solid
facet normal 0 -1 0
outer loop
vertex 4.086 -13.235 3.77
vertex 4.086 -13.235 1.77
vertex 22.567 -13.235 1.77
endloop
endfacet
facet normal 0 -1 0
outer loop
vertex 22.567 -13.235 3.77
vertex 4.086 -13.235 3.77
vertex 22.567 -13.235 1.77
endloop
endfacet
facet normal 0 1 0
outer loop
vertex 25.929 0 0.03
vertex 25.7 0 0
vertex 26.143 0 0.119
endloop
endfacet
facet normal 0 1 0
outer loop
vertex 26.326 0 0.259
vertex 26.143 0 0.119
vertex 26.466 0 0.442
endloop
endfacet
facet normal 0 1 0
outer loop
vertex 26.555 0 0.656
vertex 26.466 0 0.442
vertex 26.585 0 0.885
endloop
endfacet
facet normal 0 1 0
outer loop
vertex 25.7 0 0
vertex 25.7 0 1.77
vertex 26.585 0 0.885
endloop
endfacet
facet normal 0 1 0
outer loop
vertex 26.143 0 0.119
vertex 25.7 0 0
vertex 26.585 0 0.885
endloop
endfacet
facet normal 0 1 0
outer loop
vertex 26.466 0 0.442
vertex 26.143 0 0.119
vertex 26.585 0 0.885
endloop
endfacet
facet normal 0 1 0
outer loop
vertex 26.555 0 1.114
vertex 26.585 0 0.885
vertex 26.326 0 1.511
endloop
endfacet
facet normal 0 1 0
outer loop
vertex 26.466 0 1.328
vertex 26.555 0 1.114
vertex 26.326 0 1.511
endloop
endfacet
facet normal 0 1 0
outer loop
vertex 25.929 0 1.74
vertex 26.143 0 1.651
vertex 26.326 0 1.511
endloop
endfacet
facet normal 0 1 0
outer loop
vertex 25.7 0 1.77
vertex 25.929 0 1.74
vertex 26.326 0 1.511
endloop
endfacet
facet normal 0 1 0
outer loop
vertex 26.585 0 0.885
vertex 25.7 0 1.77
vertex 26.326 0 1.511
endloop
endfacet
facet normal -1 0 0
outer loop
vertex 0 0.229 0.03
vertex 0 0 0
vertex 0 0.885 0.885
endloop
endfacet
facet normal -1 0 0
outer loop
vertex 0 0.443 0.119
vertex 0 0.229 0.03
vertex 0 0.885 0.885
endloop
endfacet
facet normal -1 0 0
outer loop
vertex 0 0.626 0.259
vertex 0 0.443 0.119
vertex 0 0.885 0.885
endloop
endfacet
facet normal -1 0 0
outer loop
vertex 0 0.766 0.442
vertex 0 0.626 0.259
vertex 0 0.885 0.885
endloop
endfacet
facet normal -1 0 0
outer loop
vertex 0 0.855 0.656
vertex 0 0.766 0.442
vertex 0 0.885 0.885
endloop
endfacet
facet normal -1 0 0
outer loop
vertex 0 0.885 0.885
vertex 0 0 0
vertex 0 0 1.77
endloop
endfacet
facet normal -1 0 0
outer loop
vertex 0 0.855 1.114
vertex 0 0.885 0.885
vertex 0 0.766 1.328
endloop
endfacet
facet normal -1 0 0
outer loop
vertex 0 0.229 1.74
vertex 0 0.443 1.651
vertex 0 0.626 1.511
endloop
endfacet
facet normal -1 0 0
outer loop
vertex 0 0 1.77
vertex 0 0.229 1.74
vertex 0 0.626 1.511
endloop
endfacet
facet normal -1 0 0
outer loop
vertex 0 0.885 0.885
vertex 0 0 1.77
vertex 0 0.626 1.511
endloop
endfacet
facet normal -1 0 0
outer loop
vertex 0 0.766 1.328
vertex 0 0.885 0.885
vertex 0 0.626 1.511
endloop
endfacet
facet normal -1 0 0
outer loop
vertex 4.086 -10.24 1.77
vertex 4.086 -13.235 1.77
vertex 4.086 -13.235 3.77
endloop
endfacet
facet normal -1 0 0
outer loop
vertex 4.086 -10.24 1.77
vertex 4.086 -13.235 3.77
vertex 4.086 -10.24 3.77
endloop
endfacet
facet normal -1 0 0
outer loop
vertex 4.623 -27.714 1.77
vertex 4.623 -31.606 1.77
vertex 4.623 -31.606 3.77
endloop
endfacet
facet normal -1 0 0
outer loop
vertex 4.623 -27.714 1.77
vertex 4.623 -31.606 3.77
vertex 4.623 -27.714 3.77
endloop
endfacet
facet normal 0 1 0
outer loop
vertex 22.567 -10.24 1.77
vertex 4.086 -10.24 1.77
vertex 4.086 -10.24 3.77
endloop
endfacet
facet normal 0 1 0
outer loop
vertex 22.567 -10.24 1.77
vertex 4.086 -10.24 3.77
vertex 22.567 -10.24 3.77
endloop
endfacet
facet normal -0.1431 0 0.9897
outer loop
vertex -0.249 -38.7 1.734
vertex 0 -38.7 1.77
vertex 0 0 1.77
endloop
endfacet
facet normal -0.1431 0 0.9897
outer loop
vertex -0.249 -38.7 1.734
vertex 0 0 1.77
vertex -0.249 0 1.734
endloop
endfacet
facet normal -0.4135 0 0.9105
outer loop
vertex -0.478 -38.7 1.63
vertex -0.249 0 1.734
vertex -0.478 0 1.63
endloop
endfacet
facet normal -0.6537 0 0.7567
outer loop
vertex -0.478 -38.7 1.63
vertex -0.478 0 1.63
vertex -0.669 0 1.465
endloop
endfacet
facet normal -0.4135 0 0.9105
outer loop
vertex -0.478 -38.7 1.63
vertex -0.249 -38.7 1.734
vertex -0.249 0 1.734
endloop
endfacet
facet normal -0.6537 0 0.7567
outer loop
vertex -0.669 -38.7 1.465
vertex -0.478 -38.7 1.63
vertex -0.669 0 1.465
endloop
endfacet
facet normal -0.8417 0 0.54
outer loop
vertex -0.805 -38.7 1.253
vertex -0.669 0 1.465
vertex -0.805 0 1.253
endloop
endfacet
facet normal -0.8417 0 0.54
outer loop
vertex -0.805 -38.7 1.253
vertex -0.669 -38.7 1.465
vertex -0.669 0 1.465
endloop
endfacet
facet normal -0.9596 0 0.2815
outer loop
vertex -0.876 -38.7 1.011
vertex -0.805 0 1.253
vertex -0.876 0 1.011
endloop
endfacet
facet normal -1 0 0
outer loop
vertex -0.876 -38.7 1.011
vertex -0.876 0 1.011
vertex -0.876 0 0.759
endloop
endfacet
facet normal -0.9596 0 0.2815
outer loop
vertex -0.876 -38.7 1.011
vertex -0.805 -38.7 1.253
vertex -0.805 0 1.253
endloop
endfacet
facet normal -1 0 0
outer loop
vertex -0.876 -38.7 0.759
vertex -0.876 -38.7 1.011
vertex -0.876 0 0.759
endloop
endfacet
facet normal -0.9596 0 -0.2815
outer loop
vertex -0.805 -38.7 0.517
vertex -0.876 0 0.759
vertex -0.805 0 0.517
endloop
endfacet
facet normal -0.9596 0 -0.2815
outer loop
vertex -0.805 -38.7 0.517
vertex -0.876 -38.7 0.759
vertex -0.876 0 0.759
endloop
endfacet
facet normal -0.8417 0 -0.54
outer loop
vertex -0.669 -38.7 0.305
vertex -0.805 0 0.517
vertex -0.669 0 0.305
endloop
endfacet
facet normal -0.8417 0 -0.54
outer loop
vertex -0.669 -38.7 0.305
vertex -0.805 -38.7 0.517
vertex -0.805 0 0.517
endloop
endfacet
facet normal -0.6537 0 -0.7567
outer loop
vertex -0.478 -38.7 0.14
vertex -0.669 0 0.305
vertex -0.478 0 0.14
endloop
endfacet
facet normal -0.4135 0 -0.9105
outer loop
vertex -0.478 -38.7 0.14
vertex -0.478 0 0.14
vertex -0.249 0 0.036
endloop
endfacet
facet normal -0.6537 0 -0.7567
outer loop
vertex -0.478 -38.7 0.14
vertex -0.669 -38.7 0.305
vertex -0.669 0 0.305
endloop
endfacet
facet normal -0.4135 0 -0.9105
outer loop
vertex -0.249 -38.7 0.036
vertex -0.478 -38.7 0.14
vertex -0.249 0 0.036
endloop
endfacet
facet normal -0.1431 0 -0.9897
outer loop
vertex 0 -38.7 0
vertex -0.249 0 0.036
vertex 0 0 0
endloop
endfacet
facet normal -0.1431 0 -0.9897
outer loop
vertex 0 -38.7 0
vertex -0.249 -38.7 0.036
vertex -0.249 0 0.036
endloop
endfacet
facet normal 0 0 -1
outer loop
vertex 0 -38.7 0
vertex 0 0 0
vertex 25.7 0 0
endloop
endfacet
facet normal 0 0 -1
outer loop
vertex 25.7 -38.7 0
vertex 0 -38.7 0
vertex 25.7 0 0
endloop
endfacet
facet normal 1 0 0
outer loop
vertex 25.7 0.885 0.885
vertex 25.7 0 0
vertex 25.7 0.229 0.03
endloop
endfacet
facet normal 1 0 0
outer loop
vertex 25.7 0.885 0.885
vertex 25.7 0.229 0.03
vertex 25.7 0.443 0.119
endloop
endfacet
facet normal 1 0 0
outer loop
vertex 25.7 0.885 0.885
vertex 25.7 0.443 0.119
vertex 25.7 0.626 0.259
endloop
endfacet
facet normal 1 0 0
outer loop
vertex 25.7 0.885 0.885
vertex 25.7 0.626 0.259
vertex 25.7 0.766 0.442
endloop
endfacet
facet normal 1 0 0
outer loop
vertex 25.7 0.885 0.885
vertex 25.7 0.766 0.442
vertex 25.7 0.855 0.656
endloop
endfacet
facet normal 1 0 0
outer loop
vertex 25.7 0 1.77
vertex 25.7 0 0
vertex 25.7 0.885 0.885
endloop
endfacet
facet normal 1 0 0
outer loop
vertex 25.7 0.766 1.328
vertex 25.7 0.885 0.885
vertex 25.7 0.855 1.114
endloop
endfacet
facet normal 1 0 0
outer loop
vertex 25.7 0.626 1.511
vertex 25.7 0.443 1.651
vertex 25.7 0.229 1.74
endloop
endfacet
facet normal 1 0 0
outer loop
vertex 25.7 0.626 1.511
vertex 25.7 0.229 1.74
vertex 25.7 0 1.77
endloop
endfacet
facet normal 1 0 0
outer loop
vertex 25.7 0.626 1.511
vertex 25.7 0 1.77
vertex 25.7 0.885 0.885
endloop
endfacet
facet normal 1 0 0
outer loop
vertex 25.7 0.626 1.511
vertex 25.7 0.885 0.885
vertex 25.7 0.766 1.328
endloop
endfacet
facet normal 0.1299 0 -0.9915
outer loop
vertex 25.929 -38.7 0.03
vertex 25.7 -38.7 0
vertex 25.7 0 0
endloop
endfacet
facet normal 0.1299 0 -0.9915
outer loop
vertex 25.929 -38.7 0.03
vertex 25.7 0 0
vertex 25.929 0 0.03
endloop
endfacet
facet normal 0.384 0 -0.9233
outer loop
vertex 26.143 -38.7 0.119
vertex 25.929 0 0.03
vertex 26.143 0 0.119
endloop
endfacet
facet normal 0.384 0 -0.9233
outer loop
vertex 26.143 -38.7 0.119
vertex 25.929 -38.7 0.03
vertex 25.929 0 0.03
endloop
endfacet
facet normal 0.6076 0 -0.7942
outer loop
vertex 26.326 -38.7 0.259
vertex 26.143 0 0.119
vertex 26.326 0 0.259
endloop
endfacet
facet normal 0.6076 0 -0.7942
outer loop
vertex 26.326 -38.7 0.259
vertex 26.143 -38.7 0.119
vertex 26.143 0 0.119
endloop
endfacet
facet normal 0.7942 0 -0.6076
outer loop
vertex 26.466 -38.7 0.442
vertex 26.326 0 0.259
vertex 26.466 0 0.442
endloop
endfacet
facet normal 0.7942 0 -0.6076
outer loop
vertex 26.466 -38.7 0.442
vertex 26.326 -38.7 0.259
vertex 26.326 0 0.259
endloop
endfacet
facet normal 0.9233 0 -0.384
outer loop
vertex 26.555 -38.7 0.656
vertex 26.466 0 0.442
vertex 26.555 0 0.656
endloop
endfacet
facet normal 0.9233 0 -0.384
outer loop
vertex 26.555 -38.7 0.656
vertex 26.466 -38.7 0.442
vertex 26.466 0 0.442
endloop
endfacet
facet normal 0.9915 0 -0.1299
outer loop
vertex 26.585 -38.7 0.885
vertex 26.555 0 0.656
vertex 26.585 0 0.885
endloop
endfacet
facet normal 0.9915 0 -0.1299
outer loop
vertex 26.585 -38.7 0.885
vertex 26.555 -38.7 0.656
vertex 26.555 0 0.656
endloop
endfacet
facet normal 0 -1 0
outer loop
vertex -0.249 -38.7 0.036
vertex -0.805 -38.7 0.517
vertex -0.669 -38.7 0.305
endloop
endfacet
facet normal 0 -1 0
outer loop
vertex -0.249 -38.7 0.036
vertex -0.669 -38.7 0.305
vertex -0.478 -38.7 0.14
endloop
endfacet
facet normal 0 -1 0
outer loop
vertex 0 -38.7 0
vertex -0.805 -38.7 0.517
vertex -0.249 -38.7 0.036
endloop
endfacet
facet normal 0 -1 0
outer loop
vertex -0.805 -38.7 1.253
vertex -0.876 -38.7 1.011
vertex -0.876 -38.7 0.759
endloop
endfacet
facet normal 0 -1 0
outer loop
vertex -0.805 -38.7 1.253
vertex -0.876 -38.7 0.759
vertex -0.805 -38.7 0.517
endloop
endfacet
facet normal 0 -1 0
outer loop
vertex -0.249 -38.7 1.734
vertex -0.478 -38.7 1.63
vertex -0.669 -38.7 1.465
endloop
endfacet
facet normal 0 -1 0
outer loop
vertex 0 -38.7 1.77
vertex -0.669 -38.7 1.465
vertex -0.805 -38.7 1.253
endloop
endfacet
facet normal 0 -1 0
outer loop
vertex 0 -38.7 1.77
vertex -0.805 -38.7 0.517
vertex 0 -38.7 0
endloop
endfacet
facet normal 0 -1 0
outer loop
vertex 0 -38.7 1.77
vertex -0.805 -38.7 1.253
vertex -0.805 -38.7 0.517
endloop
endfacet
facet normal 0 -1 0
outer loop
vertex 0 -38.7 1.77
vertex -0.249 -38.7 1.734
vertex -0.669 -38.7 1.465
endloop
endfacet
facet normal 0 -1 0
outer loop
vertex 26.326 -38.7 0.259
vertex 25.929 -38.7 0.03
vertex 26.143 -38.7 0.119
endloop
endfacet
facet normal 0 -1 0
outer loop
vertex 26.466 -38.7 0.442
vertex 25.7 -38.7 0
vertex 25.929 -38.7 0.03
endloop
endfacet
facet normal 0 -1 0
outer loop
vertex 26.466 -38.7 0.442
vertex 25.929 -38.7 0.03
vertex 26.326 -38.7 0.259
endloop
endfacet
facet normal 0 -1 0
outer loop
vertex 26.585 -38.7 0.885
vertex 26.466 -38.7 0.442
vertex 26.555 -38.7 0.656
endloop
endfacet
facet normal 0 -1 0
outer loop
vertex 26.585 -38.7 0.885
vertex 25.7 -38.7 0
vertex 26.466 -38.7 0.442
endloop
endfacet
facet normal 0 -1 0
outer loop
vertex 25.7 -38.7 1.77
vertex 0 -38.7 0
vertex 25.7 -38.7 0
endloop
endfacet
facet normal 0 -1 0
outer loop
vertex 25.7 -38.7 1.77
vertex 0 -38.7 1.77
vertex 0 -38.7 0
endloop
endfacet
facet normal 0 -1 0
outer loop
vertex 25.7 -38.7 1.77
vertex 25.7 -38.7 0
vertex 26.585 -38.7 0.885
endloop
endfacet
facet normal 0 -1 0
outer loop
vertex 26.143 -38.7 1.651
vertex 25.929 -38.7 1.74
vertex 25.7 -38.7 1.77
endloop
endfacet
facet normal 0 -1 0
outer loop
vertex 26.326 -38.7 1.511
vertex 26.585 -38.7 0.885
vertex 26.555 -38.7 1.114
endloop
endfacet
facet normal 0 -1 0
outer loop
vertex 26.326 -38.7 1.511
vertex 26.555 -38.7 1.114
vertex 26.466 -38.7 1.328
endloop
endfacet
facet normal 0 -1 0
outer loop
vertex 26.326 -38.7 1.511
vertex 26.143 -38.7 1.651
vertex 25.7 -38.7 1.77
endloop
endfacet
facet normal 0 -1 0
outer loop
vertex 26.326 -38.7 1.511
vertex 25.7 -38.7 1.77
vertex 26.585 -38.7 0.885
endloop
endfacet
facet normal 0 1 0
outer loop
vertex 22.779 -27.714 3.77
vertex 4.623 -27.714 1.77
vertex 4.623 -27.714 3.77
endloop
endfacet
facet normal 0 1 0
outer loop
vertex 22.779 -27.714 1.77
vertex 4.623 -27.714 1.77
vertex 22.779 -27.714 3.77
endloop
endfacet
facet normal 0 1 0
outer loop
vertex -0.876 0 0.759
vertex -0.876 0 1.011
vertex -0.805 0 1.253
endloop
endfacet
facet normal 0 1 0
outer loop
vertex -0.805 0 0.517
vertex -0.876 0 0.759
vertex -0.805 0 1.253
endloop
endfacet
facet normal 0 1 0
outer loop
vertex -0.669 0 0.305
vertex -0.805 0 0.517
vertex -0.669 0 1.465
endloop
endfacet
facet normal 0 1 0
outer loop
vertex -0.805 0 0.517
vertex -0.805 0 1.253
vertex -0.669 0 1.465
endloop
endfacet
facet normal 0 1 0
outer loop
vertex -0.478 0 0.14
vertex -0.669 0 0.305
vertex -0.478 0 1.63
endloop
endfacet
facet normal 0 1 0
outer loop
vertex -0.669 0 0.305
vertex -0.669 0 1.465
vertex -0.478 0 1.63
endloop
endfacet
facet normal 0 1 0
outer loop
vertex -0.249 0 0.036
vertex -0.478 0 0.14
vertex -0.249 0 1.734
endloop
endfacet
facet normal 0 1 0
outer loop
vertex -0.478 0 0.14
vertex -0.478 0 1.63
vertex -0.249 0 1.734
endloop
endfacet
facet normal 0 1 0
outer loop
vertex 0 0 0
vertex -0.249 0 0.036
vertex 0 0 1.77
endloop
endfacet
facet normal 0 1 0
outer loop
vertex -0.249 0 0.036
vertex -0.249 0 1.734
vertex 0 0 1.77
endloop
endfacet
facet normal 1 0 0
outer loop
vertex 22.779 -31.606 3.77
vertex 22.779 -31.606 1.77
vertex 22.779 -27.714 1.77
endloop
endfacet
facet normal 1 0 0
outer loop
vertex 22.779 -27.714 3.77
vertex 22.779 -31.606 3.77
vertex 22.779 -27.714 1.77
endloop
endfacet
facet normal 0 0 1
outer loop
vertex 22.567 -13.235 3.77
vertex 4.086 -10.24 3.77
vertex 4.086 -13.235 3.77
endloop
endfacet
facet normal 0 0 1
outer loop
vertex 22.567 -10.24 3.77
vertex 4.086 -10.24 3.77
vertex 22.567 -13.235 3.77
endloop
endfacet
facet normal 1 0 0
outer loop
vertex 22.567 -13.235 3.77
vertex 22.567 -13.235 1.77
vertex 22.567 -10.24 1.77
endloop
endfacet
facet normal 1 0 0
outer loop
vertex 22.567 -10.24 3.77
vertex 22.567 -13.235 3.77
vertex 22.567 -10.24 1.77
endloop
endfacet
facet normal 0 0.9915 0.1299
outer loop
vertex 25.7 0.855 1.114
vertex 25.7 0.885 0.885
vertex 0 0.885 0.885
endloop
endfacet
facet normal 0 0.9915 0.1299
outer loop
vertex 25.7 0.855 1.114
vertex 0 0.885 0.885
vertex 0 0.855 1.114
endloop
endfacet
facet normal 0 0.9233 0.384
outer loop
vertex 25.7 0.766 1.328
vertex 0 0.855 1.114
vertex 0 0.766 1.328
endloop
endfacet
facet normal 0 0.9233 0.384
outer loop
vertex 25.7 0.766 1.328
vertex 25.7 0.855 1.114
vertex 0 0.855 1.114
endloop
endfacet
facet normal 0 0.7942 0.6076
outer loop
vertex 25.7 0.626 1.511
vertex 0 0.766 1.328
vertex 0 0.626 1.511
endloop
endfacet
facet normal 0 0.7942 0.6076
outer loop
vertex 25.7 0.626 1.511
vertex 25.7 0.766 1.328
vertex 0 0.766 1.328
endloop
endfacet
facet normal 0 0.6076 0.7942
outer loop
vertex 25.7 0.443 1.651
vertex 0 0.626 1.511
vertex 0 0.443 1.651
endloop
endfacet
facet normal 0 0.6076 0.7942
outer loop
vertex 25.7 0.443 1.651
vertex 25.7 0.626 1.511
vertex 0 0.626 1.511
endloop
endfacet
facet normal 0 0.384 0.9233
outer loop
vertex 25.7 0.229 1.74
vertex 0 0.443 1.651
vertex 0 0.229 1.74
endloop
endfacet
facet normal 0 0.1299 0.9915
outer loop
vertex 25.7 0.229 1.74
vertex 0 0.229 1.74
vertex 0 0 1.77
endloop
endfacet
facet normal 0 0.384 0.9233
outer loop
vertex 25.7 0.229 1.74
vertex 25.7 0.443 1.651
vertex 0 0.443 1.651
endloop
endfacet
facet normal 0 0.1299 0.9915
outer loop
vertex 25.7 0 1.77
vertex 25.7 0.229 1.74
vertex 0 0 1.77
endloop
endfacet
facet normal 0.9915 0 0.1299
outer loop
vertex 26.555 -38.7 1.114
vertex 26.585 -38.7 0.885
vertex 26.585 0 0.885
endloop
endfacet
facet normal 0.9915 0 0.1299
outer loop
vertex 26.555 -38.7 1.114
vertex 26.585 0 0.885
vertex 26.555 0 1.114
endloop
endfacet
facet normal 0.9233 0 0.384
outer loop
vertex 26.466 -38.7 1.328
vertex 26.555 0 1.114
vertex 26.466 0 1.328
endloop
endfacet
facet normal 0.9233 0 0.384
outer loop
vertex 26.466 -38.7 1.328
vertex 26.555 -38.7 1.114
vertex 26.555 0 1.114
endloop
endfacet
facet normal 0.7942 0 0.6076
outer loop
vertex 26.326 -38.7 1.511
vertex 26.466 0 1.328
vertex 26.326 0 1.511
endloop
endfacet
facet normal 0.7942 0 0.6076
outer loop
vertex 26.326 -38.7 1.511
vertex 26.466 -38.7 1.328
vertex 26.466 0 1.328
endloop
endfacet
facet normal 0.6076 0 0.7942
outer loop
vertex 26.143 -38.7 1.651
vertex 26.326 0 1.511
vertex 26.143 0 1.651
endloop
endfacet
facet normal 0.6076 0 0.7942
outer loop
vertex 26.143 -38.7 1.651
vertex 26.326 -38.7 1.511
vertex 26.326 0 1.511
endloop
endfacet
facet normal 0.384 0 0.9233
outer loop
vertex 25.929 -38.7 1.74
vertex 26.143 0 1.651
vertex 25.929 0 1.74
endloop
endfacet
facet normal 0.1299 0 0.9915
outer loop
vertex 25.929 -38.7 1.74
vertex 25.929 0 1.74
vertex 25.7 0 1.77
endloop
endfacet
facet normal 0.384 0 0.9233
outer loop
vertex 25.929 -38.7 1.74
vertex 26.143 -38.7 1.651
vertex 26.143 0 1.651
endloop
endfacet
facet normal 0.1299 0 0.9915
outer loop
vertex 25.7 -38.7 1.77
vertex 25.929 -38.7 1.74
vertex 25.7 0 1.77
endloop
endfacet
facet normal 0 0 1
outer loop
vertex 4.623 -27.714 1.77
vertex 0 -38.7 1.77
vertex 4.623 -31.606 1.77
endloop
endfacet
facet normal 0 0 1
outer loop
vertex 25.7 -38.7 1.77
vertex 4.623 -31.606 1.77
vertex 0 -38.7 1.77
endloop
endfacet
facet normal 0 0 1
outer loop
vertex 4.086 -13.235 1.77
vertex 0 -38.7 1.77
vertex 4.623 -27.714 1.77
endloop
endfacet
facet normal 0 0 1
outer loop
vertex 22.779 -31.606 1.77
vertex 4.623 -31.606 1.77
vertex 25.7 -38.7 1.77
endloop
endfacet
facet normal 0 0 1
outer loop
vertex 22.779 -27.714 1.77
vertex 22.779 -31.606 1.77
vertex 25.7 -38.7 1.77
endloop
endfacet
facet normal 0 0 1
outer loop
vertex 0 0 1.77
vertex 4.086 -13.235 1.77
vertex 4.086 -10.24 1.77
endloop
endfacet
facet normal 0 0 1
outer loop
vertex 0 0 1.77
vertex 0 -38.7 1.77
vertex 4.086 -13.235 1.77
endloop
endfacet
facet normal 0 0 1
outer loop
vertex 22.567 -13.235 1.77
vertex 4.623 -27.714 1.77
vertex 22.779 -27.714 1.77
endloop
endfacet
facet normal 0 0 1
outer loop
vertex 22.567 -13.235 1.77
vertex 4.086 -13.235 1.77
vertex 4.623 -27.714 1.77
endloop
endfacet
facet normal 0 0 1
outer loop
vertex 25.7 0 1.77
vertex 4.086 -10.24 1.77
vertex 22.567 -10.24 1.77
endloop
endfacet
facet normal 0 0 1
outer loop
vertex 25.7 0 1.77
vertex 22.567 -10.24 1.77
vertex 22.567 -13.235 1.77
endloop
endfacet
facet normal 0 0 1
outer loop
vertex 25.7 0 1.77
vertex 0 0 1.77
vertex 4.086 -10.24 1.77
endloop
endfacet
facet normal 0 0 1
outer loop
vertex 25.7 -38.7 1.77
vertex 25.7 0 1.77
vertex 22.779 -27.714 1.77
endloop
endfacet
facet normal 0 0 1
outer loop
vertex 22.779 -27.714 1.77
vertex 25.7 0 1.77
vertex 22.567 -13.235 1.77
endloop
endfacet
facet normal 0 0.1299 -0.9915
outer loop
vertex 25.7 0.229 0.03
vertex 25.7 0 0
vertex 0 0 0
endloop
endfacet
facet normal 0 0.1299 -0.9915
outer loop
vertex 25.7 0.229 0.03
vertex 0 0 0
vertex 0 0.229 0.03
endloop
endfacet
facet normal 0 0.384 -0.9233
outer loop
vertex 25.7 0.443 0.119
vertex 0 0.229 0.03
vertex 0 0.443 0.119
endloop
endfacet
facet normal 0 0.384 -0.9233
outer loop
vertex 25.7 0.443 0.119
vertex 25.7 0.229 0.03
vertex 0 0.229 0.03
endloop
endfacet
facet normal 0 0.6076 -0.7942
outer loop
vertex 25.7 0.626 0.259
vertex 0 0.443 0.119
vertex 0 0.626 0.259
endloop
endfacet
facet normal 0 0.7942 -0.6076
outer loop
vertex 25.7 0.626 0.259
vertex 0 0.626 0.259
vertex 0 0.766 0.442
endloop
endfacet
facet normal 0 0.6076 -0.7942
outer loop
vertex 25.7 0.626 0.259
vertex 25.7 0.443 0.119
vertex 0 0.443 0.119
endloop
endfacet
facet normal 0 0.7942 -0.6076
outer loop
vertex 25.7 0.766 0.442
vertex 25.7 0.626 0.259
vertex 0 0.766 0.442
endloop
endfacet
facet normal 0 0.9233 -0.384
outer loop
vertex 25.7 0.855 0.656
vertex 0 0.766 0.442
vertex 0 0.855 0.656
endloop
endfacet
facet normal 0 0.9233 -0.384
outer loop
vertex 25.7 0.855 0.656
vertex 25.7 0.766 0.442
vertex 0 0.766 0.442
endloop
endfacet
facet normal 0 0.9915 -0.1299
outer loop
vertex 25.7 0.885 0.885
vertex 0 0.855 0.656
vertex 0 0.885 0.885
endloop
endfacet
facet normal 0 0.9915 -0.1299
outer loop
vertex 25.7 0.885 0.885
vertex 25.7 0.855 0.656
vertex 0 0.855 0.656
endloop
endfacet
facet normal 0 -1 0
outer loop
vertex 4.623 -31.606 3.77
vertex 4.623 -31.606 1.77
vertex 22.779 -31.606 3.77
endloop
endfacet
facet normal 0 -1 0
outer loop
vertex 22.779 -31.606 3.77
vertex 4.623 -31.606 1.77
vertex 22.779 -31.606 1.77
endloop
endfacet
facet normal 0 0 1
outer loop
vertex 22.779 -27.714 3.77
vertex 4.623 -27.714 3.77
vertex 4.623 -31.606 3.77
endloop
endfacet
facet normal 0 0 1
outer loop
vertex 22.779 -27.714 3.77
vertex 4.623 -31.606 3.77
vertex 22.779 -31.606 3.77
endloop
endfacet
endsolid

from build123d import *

# Parameters (mm, degrees)
F0_W     = 25.7
F0_H     = 38.7
F1_DEPTH = 1.77
F4_DEPTH = 38.7
F5_DEPTH = 25.7
F6_W     = 18.1557917967
F6_H     = 3.8920287043
F6_W_2   = 18.4808271006
F6_H_2   = 2.9954407364
F7_DEPTH = 2


with BuildPart() as f1:
    # F0 (on Top) → F1 (new body)
    with BuildSketch(Plane.XY):
        with Locations((12.85, -19.35)):
            Rectangle(F0_W, F0_H)
    extrude(amount=F1_DEPTH)

    # F2 (on face) → F4 (join)
    with BuildSketch(Plane.XZ.offset(38.7)):
        with BuildLine():
            ThreePointArc((25.7, 0), (26.3257895014, 0.2592104986), (26.585, 0.885))
            ThreePointArc((26.585, 0.885), (26.3257895014, 1.5107895014), (25.7, 1.77))
            Line((25.7, 1.77), (25.7, 0))
        make_face()
        with BuildLine():
            Line((25.7, 0), (25.7, 1.77))
            ThreePointArc((25.7, 1.77), (24.815, 0.885), (25.7, 0))
        make_face()
        with BuildLine():
            Line((0, 0), (0, 1.77))
            ThreePointArc((0, 1.77), (-0.885, 0.885), (0, 0))
        make_face()
    extrude(amount=-F4_DEPTH)

    # F3 (on face) → F5 (join)
    with BuildSketch(Plane.YZ.offset(25.7)):
        with BuildLine():
            ThreePointArc((0, 0), (0.6257895014, 0.2592104986), (0.885, 0.885))
            ThreePointArc((0.885, 0.885), (0.6257895014, 1.5107895014), (0, 1.77))
            Line((0, 1.77), (0, 0))
        make_face()
        with BuildLine():
            Line((0, 0), (0, 1.77))
            ThreePointArc((0, 1.77), (-0.885, 0.885), (0, 0))
        make_face()
    extrude(amount=-F5_DEPTH)

    # F6 (on face) → F7 (join)
    with BuildSketch(Plane.XY.offset(1.77)):
        with Locations((13.7009262107, -29.6595497057)):
            Rectangle(F6_W, F6_H)
        with Locations((13.3267915808, -11.7375161499)):
            Rectangle(F6_W_2, F6_H_2)
    extrude(amount=F7_DEPTH)


solid = f1.part
